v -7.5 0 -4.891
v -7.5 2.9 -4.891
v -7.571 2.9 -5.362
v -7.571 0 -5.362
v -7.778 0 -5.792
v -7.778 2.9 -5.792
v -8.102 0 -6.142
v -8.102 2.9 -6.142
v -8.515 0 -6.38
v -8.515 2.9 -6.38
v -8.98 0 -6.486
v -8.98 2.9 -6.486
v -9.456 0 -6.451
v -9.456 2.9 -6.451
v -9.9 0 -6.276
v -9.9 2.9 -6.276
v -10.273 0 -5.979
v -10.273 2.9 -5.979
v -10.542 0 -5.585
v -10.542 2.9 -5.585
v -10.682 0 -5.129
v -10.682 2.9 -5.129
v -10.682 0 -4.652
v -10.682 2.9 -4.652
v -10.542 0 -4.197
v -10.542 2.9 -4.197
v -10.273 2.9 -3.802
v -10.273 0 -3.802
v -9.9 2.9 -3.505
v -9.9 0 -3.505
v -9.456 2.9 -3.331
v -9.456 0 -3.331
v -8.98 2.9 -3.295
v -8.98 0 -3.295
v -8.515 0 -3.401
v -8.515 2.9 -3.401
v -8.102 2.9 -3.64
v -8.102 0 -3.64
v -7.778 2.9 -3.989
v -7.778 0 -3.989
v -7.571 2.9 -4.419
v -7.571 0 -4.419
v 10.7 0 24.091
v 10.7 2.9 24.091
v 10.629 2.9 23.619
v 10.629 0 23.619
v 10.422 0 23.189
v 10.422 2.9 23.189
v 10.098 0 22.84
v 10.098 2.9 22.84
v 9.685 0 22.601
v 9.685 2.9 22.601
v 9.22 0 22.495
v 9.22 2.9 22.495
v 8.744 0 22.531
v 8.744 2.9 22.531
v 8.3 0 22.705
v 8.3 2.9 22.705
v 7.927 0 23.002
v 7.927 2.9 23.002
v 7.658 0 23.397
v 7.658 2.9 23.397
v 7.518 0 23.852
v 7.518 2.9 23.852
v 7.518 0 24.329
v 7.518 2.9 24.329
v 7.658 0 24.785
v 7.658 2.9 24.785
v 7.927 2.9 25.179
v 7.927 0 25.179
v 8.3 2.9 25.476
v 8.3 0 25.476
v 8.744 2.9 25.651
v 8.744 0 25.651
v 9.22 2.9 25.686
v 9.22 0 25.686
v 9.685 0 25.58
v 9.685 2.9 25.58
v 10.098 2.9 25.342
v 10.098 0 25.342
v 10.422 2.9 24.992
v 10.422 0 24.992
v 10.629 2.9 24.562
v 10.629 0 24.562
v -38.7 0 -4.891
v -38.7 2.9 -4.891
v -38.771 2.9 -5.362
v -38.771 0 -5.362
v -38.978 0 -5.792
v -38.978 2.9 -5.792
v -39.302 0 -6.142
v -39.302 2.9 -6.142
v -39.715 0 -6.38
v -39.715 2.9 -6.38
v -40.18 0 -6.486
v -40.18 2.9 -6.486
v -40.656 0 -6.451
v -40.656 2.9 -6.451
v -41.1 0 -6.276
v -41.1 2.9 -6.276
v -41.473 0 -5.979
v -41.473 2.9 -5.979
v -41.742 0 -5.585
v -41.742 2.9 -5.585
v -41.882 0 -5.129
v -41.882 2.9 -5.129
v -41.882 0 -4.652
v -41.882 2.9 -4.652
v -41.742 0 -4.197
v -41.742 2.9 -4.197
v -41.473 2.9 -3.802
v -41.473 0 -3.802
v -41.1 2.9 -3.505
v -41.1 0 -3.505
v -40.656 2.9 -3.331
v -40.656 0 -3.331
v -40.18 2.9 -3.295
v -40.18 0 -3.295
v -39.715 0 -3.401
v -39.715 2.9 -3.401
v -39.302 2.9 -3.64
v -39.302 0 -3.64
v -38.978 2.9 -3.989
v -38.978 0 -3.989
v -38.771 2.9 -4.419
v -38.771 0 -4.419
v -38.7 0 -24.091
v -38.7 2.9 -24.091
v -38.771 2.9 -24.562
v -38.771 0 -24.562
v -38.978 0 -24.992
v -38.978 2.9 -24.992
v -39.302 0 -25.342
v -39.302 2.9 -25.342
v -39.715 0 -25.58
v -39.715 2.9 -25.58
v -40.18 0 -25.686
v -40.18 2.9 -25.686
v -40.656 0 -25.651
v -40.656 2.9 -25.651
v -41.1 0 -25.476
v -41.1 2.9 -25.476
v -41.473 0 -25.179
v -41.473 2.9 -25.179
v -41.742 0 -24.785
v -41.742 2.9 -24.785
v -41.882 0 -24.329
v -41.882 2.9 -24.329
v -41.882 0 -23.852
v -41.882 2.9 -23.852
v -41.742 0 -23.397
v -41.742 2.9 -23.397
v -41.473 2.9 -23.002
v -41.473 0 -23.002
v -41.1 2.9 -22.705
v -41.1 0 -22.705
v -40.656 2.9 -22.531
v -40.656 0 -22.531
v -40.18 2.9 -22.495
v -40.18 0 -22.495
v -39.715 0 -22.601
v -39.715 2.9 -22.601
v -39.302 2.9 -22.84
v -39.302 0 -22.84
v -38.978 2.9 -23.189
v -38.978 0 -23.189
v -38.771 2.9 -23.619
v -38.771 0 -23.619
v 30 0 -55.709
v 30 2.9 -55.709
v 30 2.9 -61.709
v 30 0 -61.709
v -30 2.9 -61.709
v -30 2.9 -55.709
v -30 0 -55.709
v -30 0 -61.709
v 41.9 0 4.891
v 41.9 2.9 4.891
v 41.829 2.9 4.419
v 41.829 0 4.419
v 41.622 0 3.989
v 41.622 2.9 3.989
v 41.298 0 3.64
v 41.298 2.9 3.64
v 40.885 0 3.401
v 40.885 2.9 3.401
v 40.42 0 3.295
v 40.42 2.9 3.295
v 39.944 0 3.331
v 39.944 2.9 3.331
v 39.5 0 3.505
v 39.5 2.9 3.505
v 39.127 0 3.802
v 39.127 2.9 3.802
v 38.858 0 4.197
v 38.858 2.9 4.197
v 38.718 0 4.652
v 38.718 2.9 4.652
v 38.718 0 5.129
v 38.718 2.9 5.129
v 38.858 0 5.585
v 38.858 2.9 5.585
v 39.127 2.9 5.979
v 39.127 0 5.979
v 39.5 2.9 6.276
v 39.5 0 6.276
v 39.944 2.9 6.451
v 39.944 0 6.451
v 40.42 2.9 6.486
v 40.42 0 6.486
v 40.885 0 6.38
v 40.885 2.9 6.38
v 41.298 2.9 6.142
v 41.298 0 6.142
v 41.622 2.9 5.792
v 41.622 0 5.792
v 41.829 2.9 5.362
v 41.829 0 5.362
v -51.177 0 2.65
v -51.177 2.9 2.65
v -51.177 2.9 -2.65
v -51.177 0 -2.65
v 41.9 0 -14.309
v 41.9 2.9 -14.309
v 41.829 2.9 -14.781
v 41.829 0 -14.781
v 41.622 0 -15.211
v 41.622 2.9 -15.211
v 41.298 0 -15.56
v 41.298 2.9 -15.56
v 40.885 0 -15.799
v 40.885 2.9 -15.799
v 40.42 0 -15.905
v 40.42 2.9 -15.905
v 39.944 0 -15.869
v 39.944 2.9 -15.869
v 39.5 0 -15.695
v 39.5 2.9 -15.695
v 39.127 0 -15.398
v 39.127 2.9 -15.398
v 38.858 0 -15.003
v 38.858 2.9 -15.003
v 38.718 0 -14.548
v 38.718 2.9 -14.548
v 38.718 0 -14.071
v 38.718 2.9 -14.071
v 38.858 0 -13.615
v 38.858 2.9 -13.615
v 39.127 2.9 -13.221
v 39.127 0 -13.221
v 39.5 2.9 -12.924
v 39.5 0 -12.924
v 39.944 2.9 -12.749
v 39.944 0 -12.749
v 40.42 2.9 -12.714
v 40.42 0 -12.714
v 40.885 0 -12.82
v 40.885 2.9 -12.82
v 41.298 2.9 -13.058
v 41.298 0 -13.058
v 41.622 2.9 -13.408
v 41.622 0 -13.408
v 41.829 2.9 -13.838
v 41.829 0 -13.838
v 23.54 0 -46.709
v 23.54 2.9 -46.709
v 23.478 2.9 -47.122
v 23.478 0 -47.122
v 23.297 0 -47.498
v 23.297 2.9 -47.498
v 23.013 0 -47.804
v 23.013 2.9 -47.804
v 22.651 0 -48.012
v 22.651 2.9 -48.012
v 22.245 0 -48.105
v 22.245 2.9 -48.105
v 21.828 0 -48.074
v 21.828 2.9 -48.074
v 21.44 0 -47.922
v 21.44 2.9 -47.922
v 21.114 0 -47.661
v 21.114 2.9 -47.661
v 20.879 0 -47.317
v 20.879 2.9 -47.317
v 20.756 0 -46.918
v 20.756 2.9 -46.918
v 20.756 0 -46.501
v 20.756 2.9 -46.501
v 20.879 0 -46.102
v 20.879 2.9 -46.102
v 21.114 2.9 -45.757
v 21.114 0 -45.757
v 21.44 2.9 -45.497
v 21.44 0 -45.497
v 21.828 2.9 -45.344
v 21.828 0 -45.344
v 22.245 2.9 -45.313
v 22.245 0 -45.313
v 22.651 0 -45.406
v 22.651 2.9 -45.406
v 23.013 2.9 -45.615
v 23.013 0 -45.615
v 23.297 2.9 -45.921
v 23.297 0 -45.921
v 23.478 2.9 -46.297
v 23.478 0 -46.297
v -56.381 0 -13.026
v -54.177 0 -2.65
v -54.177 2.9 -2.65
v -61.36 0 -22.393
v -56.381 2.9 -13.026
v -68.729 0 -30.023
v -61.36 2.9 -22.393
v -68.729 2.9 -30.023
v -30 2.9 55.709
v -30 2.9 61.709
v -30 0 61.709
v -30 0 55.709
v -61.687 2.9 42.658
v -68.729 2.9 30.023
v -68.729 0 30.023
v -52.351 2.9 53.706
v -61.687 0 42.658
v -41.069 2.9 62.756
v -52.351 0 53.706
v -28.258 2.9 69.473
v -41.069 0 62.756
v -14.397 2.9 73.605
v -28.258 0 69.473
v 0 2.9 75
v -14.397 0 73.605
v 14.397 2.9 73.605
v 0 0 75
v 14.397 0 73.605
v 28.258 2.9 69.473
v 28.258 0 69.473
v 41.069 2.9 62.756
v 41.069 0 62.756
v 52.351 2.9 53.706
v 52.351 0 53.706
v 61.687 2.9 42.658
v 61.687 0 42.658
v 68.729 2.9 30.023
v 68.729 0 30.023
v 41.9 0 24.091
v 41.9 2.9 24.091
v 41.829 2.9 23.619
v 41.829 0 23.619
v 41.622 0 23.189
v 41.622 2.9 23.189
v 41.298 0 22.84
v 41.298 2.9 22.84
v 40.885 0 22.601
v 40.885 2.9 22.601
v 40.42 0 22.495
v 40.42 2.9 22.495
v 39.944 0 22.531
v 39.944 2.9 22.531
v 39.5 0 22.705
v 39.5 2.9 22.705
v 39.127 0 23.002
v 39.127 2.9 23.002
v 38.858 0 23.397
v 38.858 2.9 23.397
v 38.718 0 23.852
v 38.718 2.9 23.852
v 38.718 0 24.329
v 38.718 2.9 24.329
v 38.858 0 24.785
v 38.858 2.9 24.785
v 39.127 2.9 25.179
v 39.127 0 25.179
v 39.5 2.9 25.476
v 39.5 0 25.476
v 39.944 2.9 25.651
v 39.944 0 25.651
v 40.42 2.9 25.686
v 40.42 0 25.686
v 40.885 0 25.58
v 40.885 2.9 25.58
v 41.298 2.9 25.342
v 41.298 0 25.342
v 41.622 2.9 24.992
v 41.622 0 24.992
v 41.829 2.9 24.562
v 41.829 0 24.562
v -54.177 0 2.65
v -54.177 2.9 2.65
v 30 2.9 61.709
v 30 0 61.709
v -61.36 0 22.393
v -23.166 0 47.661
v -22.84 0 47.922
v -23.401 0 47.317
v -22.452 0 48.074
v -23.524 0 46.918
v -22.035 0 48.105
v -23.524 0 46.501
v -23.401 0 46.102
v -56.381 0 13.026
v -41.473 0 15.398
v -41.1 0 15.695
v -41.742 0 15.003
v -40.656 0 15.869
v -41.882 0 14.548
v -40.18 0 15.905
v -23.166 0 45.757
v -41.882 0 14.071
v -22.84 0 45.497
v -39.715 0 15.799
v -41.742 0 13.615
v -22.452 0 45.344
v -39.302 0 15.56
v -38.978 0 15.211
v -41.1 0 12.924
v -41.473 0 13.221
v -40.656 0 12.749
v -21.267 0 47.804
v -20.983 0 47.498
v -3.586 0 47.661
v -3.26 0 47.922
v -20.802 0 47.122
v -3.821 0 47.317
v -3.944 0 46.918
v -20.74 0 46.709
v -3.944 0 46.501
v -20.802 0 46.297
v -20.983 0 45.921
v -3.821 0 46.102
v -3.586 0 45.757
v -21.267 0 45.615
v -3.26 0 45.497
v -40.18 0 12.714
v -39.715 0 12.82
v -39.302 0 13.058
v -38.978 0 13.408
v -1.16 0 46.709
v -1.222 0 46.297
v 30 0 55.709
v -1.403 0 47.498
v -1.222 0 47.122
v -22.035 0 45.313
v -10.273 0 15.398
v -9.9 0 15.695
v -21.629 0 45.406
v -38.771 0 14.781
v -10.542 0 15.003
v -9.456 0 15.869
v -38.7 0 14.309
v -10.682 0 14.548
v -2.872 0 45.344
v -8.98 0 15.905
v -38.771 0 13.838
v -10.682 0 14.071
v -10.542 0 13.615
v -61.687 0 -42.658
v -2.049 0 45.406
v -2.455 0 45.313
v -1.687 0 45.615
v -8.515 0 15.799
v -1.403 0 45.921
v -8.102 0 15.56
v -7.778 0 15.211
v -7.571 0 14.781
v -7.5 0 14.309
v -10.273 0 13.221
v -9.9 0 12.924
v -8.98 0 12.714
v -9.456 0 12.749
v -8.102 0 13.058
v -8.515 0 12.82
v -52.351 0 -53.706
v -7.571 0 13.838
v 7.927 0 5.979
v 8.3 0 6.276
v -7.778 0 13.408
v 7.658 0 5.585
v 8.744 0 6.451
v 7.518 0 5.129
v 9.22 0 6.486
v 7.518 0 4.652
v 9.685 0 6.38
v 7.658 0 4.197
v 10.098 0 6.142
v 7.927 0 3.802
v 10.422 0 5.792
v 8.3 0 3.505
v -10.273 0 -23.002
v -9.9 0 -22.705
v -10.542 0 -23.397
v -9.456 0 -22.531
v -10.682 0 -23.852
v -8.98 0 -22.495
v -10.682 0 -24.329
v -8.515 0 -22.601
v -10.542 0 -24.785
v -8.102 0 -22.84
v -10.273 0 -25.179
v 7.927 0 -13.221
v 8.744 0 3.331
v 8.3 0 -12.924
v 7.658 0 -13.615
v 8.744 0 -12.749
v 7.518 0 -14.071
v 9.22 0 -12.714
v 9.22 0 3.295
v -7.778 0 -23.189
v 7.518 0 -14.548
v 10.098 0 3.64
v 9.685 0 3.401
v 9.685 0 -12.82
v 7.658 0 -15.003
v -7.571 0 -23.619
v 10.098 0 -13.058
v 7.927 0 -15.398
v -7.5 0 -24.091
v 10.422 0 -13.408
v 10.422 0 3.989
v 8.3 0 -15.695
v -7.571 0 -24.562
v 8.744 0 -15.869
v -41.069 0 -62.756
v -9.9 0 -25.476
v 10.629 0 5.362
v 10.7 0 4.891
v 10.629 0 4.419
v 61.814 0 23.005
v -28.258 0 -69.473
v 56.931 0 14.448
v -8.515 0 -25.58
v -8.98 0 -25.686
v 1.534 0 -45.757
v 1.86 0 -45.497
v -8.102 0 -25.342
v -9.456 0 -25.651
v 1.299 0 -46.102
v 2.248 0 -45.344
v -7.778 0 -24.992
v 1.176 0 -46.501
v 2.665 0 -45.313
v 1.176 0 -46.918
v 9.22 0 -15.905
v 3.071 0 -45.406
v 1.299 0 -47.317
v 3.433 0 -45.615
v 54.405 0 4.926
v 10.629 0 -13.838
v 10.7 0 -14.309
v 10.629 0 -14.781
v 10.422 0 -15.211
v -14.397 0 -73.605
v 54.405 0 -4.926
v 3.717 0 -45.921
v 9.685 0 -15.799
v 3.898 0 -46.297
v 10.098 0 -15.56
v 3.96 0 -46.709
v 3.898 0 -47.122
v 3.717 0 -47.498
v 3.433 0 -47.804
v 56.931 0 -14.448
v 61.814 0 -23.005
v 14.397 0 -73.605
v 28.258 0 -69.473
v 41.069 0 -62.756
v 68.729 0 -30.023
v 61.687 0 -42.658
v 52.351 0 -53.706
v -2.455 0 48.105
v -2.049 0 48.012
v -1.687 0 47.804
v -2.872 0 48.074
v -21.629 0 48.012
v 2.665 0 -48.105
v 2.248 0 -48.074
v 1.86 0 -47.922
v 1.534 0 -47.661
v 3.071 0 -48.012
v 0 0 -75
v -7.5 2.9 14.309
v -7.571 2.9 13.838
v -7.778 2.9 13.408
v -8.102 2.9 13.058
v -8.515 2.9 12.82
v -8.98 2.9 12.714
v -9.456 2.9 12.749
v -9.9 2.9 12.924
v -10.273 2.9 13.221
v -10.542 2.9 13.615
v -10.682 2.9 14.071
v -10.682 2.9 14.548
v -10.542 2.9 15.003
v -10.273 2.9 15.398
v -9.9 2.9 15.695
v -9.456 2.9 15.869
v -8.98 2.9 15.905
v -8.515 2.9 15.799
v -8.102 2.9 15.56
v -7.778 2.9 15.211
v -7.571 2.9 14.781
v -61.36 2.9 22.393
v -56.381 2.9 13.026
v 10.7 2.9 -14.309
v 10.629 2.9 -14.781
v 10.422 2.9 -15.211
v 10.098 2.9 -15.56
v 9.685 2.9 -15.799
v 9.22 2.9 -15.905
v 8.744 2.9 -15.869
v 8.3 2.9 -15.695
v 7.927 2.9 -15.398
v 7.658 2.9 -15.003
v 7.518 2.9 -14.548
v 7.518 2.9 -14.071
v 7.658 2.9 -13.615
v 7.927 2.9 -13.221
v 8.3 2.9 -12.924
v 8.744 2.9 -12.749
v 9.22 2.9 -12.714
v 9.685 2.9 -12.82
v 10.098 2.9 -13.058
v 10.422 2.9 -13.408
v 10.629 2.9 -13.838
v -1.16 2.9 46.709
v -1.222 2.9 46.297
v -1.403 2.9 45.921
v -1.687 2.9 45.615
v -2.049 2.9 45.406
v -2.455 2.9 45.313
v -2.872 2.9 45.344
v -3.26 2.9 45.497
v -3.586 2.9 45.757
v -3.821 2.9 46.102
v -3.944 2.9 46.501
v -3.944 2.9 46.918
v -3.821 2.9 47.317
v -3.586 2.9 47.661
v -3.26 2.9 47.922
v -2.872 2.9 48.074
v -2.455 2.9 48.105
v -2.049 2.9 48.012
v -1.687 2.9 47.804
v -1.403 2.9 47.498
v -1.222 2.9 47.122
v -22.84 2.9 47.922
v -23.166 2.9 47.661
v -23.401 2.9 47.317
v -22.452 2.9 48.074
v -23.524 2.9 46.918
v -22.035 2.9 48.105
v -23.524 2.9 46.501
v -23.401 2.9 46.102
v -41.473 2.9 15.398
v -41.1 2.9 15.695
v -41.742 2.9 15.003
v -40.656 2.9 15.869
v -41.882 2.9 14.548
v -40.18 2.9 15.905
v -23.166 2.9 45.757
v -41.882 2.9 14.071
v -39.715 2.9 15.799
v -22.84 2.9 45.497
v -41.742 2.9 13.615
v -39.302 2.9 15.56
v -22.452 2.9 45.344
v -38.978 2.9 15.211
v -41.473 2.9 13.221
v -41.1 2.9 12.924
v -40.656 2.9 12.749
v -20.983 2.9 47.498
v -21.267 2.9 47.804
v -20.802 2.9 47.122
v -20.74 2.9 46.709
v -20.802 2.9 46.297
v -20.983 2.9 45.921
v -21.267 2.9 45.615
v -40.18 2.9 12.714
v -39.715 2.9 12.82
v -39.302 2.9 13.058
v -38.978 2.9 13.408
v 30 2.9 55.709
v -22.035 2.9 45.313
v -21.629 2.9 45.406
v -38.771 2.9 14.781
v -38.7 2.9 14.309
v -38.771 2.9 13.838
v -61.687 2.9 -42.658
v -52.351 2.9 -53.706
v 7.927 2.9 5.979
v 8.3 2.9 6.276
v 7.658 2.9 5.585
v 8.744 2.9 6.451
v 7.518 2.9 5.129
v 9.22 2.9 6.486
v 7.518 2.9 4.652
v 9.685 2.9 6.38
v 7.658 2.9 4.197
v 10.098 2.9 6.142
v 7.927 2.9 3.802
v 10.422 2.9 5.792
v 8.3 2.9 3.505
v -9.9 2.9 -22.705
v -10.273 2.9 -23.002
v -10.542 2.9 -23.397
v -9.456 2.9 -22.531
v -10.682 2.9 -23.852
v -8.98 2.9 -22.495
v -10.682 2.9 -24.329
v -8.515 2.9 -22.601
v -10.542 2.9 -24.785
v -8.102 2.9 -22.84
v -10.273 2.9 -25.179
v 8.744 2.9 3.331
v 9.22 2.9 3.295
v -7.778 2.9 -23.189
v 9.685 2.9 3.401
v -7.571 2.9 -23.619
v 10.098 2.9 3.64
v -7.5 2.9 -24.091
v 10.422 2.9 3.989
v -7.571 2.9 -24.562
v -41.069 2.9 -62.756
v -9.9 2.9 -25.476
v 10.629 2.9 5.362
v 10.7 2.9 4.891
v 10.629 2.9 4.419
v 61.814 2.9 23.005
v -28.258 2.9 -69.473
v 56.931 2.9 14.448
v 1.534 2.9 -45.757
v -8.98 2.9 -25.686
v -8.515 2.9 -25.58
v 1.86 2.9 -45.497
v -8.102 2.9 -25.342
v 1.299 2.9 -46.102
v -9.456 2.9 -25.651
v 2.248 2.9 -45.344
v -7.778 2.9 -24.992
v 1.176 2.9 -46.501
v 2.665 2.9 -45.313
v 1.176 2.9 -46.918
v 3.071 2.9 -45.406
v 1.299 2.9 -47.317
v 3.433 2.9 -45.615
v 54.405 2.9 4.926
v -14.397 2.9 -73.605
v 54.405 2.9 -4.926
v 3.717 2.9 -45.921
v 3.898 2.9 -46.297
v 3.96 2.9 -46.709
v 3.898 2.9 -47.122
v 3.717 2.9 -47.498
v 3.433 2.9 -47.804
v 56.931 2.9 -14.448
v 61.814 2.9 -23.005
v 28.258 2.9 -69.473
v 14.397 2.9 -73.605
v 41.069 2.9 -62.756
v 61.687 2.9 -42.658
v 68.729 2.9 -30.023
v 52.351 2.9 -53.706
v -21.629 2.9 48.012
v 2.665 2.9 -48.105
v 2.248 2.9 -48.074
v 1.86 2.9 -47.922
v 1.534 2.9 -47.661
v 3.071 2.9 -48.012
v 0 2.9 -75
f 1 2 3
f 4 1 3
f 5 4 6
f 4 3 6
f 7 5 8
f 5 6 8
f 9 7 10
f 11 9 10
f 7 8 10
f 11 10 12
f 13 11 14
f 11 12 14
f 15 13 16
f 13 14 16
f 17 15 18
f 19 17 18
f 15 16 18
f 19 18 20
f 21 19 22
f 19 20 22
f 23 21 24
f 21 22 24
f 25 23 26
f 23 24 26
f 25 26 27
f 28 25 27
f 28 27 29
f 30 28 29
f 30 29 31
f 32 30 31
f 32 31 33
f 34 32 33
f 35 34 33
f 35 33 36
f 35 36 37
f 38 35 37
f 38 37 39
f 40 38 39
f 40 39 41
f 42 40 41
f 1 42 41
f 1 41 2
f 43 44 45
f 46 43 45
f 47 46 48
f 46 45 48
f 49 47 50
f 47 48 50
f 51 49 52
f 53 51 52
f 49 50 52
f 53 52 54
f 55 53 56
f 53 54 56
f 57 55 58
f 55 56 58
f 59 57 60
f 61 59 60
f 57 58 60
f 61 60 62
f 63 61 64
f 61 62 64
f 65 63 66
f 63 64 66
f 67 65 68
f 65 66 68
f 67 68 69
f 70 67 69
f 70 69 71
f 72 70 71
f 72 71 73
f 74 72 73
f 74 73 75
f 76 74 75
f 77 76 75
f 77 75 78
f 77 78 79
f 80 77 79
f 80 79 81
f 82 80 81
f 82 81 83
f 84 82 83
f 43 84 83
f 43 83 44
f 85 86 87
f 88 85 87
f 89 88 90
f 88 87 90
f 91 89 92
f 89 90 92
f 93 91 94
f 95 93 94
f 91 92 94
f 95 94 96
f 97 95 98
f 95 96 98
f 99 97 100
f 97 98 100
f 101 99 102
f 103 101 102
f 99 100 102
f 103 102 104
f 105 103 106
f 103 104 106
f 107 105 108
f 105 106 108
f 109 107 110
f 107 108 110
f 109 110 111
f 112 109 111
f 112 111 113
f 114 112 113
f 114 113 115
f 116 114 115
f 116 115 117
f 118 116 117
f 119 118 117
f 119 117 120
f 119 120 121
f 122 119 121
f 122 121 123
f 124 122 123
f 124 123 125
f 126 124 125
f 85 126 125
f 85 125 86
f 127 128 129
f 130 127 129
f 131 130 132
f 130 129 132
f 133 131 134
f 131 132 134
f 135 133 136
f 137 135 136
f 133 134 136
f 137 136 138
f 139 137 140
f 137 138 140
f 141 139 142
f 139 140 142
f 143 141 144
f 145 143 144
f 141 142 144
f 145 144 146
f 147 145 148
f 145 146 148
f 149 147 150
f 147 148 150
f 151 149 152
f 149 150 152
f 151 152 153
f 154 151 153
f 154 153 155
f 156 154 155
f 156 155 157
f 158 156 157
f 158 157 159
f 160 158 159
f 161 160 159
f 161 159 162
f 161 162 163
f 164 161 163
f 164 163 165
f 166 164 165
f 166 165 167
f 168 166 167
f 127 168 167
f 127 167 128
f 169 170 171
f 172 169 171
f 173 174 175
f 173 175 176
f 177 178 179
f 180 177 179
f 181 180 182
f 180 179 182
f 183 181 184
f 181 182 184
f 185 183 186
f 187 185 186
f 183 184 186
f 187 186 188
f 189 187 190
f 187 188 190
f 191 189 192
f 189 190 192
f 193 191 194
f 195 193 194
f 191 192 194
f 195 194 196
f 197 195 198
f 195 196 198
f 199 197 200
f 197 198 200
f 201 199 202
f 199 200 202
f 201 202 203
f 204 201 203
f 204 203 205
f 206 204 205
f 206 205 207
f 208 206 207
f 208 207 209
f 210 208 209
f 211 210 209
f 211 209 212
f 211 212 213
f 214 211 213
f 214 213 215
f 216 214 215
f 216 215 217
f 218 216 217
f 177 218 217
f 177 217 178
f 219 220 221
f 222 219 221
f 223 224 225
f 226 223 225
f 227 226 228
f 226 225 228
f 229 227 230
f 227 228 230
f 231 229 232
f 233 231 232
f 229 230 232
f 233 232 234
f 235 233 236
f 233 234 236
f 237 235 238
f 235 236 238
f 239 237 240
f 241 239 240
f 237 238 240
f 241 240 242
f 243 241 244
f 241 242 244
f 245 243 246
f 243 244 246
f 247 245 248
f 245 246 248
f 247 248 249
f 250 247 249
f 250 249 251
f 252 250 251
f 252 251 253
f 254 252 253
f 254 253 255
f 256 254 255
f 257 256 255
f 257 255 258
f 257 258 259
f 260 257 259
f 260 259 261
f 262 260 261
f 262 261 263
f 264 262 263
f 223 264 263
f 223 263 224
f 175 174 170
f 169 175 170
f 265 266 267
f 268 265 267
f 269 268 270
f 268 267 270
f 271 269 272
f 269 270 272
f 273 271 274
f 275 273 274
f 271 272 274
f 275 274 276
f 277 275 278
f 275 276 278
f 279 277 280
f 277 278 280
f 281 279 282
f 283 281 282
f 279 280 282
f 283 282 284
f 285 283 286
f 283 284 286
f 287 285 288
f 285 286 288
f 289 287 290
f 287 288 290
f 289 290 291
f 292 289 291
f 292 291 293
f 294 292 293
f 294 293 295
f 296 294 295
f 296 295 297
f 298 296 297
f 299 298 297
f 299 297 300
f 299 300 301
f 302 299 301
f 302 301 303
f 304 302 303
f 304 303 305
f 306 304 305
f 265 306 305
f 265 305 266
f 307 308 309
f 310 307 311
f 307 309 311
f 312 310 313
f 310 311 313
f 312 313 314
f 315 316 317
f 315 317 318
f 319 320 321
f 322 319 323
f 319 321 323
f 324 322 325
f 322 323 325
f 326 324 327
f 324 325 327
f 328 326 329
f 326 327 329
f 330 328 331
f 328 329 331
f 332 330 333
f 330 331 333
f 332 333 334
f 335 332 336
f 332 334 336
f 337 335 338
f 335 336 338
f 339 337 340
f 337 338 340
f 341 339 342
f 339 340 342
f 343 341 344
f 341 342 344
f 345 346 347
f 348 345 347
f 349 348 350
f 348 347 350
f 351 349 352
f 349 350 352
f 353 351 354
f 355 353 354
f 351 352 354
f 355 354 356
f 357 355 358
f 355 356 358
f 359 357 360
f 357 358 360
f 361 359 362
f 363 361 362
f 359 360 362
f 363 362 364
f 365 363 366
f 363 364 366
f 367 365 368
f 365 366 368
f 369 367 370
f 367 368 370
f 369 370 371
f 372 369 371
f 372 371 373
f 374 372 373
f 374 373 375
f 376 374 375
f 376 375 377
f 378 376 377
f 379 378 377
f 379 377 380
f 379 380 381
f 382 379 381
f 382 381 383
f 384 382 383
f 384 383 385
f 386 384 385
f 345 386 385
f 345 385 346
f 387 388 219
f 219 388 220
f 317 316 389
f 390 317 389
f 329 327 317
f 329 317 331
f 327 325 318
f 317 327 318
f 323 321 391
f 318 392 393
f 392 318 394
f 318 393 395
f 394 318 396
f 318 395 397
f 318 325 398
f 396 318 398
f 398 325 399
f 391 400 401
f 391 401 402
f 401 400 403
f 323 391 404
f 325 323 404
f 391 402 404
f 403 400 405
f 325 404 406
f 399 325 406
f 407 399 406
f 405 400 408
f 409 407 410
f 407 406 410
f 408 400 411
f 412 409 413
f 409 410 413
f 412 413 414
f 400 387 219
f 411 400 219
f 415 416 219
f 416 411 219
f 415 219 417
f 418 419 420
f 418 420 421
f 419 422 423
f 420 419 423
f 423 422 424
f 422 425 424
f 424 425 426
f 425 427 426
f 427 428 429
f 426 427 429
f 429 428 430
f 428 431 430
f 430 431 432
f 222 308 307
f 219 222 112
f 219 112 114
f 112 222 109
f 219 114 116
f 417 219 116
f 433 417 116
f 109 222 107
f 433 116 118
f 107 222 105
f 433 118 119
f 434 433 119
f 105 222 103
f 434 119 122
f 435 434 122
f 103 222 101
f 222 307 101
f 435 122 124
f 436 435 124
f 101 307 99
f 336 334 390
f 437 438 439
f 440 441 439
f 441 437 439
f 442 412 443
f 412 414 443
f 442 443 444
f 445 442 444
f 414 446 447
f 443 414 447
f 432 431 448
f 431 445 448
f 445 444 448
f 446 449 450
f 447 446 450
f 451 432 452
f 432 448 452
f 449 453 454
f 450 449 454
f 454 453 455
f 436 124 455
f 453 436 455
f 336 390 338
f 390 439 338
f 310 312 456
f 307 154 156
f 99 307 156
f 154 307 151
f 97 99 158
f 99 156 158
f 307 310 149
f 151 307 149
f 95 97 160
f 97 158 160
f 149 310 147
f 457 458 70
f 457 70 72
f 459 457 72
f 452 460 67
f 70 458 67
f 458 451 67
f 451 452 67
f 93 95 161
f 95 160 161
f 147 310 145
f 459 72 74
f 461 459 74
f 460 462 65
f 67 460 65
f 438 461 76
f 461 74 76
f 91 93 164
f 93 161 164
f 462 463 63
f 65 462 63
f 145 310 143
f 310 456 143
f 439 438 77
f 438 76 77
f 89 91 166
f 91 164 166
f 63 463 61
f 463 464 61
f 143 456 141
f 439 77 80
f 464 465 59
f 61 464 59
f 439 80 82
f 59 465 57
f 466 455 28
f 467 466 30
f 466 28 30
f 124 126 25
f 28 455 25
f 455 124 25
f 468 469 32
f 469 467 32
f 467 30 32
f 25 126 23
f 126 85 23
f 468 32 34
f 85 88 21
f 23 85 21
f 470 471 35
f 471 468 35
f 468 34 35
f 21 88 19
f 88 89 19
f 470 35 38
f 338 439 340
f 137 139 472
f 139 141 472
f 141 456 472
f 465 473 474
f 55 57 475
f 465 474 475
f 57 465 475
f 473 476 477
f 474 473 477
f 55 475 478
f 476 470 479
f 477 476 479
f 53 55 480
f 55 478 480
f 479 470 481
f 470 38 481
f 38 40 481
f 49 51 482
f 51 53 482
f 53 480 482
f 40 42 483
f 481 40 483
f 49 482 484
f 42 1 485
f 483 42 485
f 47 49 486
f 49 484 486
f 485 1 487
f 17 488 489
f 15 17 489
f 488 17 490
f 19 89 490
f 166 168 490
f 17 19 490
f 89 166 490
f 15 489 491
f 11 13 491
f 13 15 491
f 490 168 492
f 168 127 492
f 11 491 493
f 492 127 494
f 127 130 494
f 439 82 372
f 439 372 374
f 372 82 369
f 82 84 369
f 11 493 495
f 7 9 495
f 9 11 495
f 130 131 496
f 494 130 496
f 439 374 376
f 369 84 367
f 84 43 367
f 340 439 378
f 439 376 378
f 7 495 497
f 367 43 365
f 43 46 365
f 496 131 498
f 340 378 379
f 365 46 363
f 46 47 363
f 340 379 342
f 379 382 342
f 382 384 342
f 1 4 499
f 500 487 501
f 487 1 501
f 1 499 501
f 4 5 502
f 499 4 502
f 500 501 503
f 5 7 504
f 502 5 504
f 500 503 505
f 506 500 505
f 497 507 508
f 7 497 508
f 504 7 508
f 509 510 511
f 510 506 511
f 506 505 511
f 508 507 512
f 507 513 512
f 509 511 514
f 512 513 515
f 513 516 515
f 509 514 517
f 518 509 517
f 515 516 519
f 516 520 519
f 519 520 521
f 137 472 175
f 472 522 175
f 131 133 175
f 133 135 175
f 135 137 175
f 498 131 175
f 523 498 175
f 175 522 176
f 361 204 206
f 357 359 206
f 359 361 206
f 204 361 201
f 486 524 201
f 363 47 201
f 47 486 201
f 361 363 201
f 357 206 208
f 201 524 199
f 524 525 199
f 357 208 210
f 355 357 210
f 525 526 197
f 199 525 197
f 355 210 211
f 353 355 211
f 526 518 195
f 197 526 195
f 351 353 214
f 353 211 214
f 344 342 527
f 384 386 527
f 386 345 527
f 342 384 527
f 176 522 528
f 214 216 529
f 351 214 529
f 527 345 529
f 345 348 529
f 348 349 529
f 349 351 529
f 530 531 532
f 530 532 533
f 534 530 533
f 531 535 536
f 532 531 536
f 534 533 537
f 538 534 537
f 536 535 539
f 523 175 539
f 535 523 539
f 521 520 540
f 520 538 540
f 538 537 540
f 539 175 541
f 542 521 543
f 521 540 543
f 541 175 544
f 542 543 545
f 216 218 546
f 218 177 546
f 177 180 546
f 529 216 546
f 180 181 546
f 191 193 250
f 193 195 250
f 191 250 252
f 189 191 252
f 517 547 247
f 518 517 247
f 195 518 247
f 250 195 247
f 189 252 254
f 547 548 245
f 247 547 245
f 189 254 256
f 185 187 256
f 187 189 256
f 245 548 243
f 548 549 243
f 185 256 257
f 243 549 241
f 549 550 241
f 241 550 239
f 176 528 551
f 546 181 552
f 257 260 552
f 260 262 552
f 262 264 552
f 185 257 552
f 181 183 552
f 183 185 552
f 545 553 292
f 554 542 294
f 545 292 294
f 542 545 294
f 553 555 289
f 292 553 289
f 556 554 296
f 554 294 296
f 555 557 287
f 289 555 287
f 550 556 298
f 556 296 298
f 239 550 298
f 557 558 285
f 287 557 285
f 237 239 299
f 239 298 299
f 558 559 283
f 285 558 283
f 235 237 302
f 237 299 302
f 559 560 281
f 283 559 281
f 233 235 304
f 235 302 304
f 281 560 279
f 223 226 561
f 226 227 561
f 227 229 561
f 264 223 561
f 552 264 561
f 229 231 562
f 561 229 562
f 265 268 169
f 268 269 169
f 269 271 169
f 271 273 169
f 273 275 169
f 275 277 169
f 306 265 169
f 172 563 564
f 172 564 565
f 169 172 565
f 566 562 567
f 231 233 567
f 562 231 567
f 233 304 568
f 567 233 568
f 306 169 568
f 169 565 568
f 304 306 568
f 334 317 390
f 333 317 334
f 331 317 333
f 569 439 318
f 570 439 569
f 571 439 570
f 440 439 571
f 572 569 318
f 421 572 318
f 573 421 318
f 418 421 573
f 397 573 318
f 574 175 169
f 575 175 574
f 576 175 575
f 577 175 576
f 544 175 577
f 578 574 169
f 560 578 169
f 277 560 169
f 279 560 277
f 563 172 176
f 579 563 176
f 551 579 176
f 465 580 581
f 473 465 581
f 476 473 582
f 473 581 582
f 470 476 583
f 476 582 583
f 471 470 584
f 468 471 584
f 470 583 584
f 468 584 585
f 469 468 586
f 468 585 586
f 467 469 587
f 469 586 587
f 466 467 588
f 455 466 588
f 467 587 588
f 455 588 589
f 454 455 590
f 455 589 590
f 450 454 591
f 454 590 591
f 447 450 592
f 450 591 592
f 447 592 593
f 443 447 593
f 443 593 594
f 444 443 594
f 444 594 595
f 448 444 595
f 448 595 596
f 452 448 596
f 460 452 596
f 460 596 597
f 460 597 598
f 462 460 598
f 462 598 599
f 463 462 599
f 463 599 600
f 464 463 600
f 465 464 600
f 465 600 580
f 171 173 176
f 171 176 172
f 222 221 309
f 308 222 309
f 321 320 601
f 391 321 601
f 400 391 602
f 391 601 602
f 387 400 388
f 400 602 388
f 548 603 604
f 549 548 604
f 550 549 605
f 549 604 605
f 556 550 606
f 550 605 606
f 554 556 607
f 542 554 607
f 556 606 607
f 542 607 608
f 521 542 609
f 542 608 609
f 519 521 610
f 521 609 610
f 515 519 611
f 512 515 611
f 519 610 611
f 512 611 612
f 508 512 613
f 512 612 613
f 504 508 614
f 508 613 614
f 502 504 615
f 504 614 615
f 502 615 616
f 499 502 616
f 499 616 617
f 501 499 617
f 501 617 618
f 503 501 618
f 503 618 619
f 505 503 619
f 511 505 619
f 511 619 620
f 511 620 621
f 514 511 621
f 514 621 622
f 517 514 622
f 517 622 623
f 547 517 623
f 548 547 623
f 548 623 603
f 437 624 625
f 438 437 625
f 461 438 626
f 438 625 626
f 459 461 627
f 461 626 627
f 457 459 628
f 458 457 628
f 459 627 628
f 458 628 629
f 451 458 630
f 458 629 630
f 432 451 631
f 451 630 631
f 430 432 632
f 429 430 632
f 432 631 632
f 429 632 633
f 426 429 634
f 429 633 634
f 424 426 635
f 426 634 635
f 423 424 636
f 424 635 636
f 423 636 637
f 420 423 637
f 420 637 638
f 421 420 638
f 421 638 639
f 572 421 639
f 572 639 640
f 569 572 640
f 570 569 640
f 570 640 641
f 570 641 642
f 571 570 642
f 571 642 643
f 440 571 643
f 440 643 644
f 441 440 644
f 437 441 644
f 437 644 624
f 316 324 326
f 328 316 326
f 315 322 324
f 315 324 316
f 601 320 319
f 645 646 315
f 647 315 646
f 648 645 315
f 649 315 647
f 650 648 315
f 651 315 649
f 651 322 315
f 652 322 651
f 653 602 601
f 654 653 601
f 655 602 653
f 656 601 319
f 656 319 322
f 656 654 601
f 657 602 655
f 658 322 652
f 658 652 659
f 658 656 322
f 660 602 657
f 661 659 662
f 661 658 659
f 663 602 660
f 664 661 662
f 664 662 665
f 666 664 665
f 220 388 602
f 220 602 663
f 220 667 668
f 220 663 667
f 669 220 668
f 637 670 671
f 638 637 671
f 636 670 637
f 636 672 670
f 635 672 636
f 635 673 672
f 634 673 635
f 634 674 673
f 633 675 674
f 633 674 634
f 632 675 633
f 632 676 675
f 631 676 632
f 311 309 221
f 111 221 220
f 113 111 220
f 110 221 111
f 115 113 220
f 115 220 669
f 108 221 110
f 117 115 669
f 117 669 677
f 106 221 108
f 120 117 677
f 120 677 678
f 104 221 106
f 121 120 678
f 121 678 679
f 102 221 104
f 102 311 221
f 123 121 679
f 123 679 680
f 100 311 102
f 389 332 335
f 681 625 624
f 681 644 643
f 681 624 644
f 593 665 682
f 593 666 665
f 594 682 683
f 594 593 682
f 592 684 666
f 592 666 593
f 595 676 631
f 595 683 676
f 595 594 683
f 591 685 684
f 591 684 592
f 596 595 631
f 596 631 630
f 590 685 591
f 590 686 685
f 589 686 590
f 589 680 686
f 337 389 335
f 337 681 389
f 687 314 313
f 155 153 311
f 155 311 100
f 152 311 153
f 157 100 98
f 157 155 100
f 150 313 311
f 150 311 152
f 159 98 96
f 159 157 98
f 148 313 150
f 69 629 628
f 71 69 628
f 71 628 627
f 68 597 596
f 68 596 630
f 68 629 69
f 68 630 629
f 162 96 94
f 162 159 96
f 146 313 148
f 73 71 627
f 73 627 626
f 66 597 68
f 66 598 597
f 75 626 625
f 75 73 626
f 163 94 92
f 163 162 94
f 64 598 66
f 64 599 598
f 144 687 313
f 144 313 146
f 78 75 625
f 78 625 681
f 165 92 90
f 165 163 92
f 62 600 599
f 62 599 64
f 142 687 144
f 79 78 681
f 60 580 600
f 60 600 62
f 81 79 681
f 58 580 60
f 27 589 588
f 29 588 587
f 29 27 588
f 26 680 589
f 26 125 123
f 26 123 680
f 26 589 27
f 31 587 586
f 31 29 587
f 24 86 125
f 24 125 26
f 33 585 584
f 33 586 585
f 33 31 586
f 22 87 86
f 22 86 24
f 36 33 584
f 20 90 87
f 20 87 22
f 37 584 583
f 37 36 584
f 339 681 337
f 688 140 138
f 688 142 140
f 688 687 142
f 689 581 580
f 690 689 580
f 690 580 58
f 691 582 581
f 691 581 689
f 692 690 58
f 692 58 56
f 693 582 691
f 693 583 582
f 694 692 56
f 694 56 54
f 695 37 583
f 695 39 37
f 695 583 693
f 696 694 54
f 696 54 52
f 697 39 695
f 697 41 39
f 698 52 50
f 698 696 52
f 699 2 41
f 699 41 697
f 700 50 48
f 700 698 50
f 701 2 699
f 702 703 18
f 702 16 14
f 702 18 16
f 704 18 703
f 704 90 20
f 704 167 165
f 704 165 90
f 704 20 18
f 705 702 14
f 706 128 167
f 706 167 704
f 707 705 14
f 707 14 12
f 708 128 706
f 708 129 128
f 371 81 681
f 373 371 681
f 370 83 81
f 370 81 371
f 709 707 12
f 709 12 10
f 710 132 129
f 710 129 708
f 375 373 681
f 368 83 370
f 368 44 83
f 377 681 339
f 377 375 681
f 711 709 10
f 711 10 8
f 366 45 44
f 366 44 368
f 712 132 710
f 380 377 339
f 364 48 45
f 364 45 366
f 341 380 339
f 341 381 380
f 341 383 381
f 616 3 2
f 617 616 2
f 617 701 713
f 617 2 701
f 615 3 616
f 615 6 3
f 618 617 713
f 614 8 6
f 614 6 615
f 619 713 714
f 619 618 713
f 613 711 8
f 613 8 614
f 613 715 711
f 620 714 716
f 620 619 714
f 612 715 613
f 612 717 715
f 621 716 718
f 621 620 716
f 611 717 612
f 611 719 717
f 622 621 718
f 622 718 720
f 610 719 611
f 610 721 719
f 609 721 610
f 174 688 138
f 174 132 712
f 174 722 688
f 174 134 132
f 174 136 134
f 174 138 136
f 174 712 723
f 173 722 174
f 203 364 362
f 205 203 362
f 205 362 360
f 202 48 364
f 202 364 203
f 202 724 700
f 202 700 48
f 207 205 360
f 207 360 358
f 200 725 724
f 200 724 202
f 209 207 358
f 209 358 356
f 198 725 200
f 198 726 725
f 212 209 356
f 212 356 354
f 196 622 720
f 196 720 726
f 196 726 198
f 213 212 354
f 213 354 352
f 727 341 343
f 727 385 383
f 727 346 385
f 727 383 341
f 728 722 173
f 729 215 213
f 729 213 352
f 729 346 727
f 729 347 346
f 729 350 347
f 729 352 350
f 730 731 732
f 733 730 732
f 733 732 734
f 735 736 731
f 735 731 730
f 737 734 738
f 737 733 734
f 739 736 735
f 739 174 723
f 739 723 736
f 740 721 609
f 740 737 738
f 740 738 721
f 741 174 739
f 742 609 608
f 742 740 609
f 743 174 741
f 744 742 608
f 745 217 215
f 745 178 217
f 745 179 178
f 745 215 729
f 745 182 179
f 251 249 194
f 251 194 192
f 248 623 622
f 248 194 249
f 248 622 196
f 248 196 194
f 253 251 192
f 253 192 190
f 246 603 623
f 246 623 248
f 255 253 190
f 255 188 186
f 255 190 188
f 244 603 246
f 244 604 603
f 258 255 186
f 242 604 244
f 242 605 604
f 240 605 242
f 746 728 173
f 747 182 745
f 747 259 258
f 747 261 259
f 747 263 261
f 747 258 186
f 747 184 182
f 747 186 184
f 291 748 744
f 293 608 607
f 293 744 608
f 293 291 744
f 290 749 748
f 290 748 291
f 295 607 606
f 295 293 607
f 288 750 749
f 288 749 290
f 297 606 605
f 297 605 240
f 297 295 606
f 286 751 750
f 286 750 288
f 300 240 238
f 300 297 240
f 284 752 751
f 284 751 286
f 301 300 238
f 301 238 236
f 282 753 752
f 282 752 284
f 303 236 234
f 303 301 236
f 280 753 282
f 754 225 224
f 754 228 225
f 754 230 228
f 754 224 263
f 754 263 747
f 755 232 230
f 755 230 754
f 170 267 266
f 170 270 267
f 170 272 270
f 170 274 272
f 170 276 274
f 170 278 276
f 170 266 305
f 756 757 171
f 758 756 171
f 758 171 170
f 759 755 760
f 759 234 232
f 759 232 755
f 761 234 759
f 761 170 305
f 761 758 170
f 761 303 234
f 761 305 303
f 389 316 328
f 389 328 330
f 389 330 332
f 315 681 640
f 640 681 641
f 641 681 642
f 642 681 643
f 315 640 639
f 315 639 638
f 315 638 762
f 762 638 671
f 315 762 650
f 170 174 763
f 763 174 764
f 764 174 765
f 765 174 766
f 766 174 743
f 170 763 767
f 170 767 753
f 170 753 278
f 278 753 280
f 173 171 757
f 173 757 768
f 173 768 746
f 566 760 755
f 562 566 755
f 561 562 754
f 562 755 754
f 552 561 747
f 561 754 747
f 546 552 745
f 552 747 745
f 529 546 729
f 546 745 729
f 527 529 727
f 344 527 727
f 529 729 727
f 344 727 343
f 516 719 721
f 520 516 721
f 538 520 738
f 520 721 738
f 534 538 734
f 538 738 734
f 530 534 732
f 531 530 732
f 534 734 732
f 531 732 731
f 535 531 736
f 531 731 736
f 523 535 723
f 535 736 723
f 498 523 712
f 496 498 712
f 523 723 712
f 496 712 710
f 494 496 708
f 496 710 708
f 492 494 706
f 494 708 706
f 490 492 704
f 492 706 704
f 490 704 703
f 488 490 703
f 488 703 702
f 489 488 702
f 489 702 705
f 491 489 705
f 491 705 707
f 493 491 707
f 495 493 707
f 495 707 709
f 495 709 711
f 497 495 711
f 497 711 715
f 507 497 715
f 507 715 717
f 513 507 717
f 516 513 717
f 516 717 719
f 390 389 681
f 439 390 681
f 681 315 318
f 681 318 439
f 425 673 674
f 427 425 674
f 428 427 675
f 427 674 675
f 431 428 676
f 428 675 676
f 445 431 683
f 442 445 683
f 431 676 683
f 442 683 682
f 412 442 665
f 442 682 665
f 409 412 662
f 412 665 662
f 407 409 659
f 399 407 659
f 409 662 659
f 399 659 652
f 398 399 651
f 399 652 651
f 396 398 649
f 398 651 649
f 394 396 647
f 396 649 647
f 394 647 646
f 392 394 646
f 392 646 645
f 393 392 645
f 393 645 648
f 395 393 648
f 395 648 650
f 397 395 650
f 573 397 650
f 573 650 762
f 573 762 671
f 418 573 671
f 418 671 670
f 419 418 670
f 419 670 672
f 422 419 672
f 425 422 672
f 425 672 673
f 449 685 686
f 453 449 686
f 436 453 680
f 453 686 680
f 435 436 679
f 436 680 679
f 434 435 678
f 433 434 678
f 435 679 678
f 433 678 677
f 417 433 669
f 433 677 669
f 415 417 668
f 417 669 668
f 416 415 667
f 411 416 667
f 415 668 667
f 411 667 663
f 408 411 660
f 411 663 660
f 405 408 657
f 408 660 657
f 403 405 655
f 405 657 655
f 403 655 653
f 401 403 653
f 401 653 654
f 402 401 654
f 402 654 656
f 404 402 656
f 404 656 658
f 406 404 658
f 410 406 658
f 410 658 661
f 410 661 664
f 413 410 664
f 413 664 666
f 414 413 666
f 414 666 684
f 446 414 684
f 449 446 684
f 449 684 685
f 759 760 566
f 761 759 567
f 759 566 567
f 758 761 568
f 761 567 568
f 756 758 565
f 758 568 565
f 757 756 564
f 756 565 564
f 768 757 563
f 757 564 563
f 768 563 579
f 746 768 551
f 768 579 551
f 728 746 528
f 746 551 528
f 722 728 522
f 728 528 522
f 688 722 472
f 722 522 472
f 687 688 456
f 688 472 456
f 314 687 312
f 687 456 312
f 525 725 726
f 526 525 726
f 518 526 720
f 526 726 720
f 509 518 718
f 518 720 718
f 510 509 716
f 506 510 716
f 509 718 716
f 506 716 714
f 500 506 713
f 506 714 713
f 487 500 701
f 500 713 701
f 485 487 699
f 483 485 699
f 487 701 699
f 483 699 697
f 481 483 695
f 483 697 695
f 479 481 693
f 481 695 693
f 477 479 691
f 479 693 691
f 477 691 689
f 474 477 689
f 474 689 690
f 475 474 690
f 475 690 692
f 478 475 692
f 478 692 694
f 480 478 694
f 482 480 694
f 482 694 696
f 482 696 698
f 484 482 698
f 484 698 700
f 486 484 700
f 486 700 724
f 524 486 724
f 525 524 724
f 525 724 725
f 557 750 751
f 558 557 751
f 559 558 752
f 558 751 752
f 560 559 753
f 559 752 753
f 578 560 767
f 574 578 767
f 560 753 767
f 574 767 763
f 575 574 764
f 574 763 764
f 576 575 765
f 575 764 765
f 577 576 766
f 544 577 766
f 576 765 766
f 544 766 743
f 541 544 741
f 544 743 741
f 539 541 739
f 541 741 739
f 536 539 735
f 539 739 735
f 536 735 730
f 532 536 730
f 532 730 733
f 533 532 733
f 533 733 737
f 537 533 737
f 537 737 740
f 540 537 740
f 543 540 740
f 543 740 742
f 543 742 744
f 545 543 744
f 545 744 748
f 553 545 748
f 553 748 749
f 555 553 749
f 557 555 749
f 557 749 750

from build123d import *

# Parameters (mm, degrees)
SKETCH1_R           = 75
BOSS_EXTRUDE1_DEPTH = 2.9
SKETCH2_R           = 1.6
SKETCH2_R_2         = 1.4
SKETCH2_W           = 60
SKETCH2_H           = 6
CUT_EXTRUDE1_DEPTH  = 10
CUT_EXTRUDE2_DEPTH  = 3.9


with BuildPart() as part:
    # Sketch1 → Boss-Extrude1 (new body)
    with BuildSketch(Plane(origin=(0, 0, 0), x_dir=(1, 0, 0), z_dir=(0, 1, 0))):
        Circle(SKETCH1_R)
    extrude(amount=BOSS_EXTRUDE1_DEPTH)

    # Sketch2 → Cut-Extrude1 (cut)
    with BuildSketch(Plane(origin=(0, 2.9, 0), x_dir=(1, 0, 0), z_dir=(0, 1, 0))):
        with BuildLine():
            ThreePointArc((-68.72850121, -30.023209712), (-54.08520342, 0), (-68.72850121, 30.023209712))
            ThreePointArc((-68.72850121, 30.023209712), (-75, 0), (-68.72850121, -30.023209712))
        make_face()
        with BuildLine():
            ThreePointArc((75, 0), (73.415385277, 15.335618821), (68.72850121, 30.023209712))
            ThreePointArc((68.72850121, 30.023209712), (54.08520342, 0), (68.72850121, -30.023209712))
            ThreePointArc((68.72850121, -30.023209712), (73.415385277, -15.335618821), (75, 0))
        make_face()
        with Locations((9.1, -24.090757895)):
            Circle(SKETCH2_R)
        with Locations((40.3, -24.090757895)):
            Circle(SKETCH2_R)
        with Locations((40.3, -4.890757895)):
            Circle(SKETCH2_R)
        with Locations((40.3, 14.309242105)):
            Circle(SKETCH2_R)
        with Locations((9.1, 14.309242105)):
            Circle(SKETCH2_R)
        with Locations((9.1, -4.890757895)):
            Circle(SKETCH2_R)
        with Locations((-9.1, 4.890757895)):
            Circle(SKETCH2_R)
        with Locations((-9.1, -14.309242105)):
            Circle(SKETCH2_R)
        with Locations((-9.1, 24.090757895)):
            Circle(SKETCH2_R)
        with Locations((-40.3, 24.090757895)):
            Circle(SKETCH2_R)
        with Locations((-40.3, 4.890757895)):
            Circle(SKETCH2_R)
        with Locations((-40.3, -14.309242105)):
            Circle(SKETCH2_R)
        with Locations((-22.14, -46.709242105)):
            Circle(SKETCH2_R_2)
        with Locations((-2.56, -46.709242105)):
            Circle(SKETCH2_R_2)
        with Locations((22.14, 46.709242105)):
            Circle(SKETCH2_R_2)
        with Locations((2.56, 46.709242105)):
            Circle(SKETCH2_R_2)
        with Locations((0, -58.709242105)):
            Rectangle(SKETCH2_W, SKETCH2_H)
        with Locations((0, 58.709242105)):
            Rectangle(SKETCH2_W, SKETCH2_H)
    extrude(amount=-CUT_EXTRUDE1_DEPTH, mode=Mode.SUBTRACT)

    # Sketch3 → Cut-Extrude2 (cut, through all)
    with BuildSketch(Plane(origin=(0, 2.9, 0), x_dir=(1, 0, 0), z_dir=(0, 1, 0))):
        with BuildLine():
            Line((-51.177473943, 2.65), (-54.177473943, 2.65))
            ThreePointArc((-54.177473943, 2.65), (-54.08520342, 0), (-54.177473943, -2.65))
            Line((-54.177473943, -2.65), (-51.177473943, -2.65))
            Line((-51.177473943, -2.65), (-51.177473943, 2.65))
        make_face()
    extrude(amount=-CUT_EXTRUDE2_DEPTH, mode=Mode.SUBTRACT)


solid = part.part
